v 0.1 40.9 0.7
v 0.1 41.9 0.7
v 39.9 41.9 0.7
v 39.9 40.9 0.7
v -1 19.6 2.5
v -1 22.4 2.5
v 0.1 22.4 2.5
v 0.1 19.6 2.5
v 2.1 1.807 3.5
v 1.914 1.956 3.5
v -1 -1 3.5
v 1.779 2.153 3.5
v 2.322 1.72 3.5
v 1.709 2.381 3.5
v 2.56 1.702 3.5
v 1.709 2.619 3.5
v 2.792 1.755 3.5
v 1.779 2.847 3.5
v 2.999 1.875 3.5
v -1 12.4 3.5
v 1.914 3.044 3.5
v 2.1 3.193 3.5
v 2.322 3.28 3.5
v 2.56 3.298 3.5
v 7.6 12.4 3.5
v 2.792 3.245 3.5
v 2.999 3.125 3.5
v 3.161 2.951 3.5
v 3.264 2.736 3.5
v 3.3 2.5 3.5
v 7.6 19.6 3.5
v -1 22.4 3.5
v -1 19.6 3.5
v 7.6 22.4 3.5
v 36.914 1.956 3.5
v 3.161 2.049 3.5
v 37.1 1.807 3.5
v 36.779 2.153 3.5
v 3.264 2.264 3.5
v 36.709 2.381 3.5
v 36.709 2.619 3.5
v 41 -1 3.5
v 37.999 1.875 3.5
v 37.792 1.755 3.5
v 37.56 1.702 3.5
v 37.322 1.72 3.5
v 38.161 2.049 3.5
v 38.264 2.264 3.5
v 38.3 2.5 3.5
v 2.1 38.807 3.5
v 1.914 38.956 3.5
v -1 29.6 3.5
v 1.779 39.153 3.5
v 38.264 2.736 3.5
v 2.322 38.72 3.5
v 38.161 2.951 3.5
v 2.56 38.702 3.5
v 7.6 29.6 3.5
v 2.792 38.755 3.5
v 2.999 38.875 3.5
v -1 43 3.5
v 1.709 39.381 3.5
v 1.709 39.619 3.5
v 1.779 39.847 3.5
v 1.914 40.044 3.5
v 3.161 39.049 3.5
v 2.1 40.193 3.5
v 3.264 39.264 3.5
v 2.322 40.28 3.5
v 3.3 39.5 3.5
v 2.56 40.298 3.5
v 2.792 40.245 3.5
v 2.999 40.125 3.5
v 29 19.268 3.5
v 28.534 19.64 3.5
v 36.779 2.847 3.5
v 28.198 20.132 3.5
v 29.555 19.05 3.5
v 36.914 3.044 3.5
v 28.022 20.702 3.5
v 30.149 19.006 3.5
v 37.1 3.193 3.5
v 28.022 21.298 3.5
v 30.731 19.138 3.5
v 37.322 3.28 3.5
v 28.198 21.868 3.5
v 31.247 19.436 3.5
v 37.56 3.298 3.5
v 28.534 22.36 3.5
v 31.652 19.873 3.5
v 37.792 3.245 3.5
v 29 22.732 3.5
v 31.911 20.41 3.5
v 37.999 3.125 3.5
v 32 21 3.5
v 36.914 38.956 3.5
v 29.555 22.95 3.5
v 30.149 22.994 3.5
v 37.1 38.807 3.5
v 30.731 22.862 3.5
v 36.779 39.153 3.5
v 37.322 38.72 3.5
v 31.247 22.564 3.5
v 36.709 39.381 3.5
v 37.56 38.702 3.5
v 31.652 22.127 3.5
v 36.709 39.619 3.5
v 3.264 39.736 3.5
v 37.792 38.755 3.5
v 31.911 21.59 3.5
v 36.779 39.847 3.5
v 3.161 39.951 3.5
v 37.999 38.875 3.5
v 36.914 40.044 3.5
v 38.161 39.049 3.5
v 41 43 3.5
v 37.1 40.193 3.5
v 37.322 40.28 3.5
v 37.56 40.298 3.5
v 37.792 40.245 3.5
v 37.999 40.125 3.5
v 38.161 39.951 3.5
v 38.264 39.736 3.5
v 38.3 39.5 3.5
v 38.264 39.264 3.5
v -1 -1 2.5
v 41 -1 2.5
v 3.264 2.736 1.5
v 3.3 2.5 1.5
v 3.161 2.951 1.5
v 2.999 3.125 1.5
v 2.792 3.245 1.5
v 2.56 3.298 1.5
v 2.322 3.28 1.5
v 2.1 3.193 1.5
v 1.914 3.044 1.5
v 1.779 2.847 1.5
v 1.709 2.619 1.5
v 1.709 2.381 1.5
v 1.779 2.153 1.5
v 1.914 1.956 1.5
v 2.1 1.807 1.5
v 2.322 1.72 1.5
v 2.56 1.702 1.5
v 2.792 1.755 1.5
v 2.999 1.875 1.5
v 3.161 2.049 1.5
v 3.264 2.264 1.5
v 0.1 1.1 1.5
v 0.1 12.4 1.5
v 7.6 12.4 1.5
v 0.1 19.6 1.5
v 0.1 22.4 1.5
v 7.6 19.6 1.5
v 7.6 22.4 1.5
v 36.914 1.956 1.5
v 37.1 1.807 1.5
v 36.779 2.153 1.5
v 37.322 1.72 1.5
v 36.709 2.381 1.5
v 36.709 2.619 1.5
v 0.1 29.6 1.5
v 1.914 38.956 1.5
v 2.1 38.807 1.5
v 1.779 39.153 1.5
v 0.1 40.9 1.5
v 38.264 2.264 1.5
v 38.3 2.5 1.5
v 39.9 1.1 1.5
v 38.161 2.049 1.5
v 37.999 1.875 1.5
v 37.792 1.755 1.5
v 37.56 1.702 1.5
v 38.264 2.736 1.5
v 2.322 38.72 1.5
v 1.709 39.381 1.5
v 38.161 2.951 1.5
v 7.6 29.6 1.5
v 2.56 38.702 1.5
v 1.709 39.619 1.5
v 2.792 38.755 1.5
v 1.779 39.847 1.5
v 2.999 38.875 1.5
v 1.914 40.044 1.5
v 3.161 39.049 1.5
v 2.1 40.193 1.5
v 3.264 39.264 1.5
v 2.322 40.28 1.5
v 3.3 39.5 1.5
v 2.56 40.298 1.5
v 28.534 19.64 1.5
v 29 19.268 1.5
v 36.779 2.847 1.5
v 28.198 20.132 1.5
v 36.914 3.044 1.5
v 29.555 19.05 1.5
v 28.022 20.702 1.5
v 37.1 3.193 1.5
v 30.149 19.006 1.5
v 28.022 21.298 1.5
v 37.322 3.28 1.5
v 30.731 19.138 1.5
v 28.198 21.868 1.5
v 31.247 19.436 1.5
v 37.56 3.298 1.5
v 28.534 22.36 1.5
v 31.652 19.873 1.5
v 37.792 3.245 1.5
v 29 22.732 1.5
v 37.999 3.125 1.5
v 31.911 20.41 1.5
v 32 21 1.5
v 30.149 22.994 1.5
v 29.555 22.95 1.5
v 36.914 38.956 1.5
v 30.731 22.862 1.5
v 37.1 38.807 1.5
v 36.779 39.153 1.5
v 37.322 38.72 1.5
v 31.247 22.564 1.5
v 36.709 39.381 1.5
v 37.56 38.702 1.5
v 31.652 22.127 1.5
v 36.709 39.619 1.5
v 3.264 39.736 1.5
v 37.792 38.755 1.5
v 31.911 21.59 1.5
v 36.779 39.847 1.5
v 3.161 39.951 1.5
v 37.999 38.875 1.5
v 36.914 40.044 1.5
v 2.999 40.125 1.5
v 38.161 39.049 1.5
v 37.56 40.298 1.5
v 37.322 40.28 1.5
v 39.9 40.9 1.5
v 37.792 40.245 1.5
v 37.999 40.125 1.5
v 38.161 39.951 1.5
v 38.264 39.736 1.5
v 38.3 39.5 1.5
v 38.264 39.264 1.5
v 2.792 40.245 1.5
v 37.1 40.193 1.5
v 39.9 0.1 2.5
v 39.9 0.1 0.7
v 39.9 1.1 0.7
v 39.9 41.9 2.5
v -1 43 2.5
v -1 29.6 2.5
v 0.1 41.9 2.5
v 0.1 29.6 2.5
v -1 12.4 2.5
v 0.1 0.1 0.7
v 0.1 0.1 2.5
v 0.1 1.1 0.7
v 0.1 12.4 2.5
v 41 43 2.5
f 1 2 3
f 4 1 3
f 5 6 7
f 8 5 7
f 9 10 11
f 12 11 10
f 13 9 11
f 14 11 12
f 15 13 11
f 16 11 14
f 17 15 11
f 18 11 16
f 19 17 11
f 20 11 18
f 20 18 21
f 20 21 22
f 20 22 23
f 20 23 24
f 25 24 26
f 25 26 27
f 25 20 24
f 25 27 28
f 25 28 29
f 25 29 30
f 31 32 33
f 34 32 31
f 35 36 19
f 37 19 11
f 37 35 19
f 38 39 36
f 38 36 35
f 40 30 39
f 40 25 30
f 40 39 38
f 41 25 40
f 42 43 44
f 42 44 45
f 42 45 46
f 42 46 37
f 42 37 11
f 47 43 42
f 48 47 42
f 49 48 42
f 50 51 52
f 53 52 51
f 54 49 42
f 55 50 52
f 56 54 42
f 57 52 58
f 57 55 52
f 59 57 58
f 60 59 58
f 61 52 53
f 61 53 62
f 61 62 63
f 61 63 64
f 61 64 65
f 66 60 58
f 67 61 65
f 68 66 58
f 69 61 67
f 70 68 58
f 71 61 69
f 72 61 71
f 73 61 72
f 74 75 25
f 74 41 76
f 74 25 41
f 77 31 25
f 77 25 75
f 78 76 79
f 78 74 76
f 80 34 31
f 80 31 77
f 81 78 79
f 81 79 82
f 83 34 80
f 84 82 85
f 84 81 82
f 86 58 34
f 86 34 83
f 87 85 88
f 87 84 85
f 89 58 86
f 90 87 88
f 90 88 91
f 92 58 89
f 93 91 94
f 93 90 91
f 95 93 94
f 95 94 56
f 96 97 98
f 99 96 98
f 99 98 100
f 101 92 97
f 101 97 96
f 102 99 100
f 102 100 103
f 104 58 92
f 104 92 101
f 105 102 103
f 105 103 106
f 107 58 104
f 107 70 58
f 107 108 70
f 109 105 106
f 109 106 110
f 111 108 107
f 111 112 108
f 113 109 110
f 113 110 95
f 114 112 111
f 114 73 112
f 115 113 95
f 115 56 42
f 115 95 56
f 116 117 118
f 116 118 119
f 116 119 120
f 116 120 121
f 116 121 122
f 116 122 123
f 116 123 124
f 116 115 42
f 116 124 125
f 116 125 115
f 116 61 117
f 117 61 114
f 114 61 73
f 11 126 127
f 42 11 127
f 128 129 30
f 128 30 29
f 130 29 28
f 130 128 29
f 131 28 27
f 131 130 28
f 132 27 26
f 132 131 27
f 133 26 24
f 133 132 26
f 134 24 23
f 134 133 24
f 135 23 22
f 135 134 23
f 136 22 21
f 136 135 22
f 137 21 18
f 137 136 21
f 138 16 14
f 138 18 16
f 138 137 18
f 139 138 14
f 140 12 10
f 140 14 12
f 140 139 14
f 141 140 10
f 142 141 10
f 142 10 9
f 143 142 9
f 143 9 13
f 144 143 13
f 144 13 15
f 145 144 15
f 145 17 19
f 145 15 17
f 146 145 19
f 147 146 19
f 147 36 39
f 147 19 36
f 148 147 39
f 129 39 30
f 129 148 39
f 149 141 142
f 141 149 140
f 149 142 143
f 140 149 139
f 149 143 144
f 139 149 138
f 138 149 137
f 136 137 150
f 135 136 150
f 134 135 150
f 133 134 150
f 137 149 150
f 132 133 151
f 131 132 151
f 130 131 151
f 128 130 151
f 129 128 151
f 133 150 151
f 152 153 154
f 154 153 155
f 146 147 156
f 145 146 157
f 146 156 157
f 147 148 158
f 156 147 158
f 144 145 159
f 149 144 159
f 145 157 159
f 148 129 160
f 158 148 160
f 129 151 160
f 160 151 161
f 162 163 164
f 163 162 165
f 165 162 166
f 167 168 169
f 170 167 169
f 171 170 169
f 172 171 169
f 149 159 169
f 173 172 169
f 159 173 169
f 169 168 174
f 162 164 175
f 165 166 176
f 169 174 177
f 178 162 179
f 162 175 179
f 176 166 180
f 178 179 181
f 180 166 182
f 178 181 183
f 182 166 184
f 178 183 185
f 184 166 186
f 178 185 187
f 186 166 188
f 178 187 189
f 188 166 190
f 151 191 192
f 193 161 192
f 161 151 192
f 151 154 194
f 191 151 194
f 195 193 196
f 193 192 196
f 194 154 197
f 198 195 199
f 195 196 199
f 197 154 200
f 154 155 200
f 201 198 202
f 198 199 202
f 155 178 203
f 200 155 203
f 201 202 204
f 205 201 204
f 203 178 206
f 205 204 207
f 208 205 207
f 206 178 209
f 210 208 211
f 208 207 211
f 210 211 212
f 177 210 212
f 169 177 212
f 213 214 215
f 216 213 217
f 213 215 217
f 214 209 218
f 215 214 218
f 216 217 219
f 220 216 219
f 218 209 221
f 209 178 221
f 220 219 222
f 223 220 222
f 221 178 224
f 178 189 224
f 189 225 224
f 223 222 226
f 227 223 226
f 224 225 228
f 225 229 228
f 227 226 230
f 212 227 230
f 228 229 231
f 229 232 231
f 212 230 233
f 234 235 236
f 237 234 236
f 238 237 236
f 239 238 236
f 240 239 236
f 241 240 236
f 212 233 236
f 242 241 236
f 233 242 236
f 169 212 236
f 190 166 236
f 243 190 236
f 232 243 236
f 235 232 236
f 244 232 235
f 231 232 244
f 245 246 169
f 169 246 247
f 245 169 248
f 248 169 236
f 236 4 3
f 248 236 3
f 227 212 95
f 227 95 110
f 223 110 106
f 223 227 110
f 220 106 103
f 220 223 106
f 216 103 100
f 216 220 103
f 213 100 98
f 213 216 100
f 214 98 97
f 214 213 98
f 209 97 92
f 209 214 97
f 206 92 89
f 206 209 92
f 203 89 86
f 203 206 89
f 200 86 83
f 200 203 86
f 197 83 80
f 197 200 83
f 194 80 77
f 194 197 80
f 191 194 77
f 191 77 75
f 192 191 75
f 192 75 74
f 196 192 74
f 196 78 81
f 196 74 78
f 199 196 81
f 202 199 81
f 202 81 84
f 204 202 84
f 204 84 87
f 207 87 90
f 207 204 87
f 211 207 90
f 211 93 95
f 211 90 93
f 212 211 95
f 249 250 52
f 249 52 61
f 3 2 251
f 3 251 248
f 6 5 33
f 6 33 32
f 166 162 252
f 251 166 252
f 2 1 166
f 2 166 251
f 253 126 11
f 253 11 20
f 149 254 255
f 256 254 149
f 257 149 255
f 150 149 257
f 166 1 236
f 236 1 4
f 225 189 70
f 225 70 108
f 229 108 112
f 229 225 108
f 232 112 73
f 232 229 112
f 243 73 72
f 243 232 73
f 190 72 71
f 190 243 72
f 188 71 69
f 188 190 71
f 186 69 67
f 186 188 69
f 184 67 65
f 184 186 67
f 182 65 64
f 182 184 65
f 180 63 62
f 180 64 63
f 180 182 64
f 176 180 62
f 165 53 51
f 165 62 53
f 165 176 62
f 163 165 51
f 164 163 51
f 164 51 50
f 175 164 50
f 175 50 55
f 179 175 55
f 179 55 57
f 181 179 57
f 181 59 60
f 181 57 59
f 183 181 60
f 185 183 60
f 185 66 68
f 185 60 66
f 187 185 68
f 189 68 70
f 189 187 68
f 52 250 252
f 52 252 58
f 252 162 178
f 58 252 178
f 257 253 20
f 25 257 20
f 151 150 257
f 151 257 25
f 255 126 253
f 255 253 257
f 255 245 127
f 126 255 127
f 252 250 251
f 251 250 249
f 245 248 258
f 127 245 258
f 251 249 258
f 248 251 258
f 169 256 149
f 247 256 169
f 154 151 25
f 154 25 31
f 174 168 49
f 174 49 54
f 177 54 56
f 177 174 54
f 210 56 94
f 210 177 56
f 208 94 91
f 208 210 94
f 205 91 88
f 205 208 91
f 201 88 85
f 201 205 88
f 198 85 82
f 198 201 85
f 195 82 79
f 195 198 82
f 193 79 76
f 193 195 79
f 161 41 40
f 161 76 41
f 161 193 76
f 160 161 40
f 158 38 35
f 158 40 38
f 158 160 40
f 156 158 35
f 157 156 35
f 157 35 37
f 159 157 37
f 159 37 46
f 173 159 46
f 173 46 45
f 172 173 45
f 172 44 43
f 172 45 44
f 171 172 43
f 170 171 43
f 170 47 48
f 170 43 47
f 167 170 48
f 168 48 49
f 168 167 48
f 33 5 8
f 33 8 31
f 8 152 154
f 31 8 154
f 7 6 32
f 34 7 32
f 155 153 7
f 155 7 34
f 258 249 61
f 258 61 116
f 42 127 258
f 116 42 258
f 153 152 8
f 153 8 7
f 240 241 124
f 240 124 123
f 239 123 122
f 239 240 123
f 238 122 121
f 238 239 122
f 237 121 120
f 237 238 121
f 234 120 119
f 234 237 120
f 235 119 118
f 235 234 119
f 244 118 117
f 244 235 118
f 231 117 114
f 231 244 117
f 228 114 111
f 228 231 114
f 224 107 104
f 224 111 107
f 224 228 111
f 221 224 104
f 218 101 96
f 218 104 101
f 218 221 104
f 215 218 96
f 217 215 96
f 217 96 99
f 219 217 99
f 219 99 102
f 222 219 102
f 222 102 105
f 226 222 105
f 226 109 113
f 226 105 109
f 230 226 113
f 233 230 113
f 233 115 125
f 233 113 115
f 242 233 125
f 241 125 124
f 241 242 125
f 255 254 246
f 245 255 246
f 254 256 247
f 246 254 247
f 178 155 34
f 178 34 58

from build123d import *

# Parameters (mm, degrees)
CYLINDER020_R     = 2
CYLINDER020_DEPTH = 100
BOX011_W          = 20
BOX011_H          = 7.2
BOX011_DEPTH      = 10
CYLINDER016_R     = 0.8
CYLINDER016_DEPTH = 20
CYLINDER017_R     = 0.8
CYLINDER017_DEPTH = 20
CYLINDER018_R     = 0.8
CYLINDER018_DEPTH = 20
CYLINDER019_R     = 0.8
CYLINDER019_DEPTH = 20
BOX010_W          = 39.8
BOX010_H          = 1
BOX010_DEPTH      = 0.8
BOX009_W          = 39.8
BOX009_H          = 1
BOX009_DEPTH      = 0.8
BOX007_W          = 20
BOX007_H          = 7.2
BOX007_DEPTH      = 10
BOX006_W          = 42
BOX006_H          = 44
BOX006_DEPTH      = 1
BOX005_W          = 39.8
BOX005_H          = 41.8
BOX005_DEPTH      = 1


with BuildPart() as zylinder020:
    # Cylinder020 → Cylinder020 (new body)
    with BuildSketch(Plane(origin=(30, 21, -50), x_dir=(1, 0, 0), z_dir=(0, 0, 1))):
        Circle(CYLINDER020_R)
    extrude(amount=CYLINDER020_DEPTH)


with BuildPart() as w_rfel011:
    # Box011 → Box011 (new body)
    with BuildSketch(Plane(origin=(-12.4, 22.4, 0), x_dir=(1, 0, 0), z_dir=(0, 0, 1))):
        with Locations((10, 3.6)):
            Rectangle(BOX011_W, BOX011_H)
    extrude(amount=BOX011_DEPTH)


with BuildPart() as zylinder016:
    # Cylinder016 → Cylinder016 (new body)
    with BuildSketch(Plane(origin=(37.5, 2.5, -10), x_dir=(1, 0, 0), z_dir=(0, 0, 1))):
        Circle(CYLINDER016_R)
    extrude(amount=CYLINDER016_DEPTH)


with BuildPart() as zylinder017:
    # Cylinder017 → Cylinder017 (new body)
    with BuildSketch(Plane(origin=(2.5, 2.5, -10), x_dir=(1, 0, 0), z_dir=(0, 0, 1))):
        Circle(CYLINDER017_R)
    extrude(amount=CYLINDER017_DEPTH)


with BuildPart() as zylinder018:
    # Cylinder018 → Cylinder018 (new body)
    with BuildSketch(Plane(origin=(37.5, 39.5, -10), x_dir=(1, 0, 0), z_dir=(0, 0, 1))):
        Circle(CYLINDER018_R)
    extrude(amount=CYLINDER018_DEPTH)


with BuildPart() as compound006:
    # Cylinder019 → Cylinder019 (new body)
    with BuildSketch(Plane(origin=(2.5, 39.5, -10), x_dir=(1, 0, 0), z_dir=(0, 0, 1))):
        Circle(CYLINDER019_R)
    extrude(amount=CYLINDER019_DEPTH)

    # Compound006: union Zylinder016, Zylinder017, Zylinder018
    add(zylinder016.part)
    add(zylinder017.part)
    add(zylinder018.part)


with BuildPart() as w_rfel010:
    # Box010 → Box010 (new body)
    with BuildSketch(Plane(origin=(0.1, 0.1, 0.7), x_dir=(1, 0, 0), z_dir=(0, 0, 1))):
        with Locations((19.9, 0.5)):
            Rectangle(BOX010_W, BOX010_H)
    extrude(amount=BOX010_DEPTH)


with BuildPart() as compound003:
    # Box009 → Box009 (new body)
    with BuildSketch(Plane(origin=(0.1, 40.9, 0.7), x_dir=(1, 0, 0), z_dir=(0, 0, 1))):
        with Locations((19.9, 0.5)):
            Rectangle(BOX009_W, BOX009_H)
    extrude(amount=BOX009_DEPTH)

    # Compound003: union Würfel010
    add(w_rfel010.part)


with BuildPart() as w_rfel007:
    # Box007 → Box007 (new body)
    with BuildSketch(Plane(origin=(-12.4, 12.4, 0), x_dir=(1, 0, 0), z_dir=(0, 0, 1))):
        with Locations((10, 3.6)):
            Rectangle(BOX007_W, BOX007_H)
    extrude(amount=BOX007_DEPTH)


with BuildPart() as w_rfel006:
    # Box006 → Box006 (new body)
    with BuildSketch(Plane(origin=(-1, -1, 2.5), x_dir=(1, 0, 0), z_dir=(0, 0, 1))):
        with Locations((21, 22)):
            Rectangle(BOX006_W, BOX006_H)
    extrude(amount=BOX006_DEPTH)


with BuildPart() as lowerparthole:
    # Box005 → Box005 (new body)
    with BuildSketch(Plane(origin=(0.1, 0.1, 1.5), x_dir=(1, 0, 0), z_dir=(0, 0, 1))):
        with Locations((19.9, 20.9)):
            Rectangle(BOX005_W, BOX005_H)
    extrude(amount=BOX005_DEPTH)

    # Fusion001: union Würfel006
    add(w_rfel006.part)

    # Cut003: cut Würfel007
    add(w_rfel007.part, mode=Mode.SUBTRACT)

    # Fusion003: union Compound003
    add(compound003.part)

    # Cut008: cut Compound006
    add(compound006.part, mode=Mode.SUBTRACT)

    # Cut009: cut Würfel011
    add(w_rfel011.part, mode=Mode.SUBTRACT)

    # Cut010: cut Zylinder020
    add(zylinder020.part, mode=Mode.SUBTRACT)


solid = lowerparthole.part
